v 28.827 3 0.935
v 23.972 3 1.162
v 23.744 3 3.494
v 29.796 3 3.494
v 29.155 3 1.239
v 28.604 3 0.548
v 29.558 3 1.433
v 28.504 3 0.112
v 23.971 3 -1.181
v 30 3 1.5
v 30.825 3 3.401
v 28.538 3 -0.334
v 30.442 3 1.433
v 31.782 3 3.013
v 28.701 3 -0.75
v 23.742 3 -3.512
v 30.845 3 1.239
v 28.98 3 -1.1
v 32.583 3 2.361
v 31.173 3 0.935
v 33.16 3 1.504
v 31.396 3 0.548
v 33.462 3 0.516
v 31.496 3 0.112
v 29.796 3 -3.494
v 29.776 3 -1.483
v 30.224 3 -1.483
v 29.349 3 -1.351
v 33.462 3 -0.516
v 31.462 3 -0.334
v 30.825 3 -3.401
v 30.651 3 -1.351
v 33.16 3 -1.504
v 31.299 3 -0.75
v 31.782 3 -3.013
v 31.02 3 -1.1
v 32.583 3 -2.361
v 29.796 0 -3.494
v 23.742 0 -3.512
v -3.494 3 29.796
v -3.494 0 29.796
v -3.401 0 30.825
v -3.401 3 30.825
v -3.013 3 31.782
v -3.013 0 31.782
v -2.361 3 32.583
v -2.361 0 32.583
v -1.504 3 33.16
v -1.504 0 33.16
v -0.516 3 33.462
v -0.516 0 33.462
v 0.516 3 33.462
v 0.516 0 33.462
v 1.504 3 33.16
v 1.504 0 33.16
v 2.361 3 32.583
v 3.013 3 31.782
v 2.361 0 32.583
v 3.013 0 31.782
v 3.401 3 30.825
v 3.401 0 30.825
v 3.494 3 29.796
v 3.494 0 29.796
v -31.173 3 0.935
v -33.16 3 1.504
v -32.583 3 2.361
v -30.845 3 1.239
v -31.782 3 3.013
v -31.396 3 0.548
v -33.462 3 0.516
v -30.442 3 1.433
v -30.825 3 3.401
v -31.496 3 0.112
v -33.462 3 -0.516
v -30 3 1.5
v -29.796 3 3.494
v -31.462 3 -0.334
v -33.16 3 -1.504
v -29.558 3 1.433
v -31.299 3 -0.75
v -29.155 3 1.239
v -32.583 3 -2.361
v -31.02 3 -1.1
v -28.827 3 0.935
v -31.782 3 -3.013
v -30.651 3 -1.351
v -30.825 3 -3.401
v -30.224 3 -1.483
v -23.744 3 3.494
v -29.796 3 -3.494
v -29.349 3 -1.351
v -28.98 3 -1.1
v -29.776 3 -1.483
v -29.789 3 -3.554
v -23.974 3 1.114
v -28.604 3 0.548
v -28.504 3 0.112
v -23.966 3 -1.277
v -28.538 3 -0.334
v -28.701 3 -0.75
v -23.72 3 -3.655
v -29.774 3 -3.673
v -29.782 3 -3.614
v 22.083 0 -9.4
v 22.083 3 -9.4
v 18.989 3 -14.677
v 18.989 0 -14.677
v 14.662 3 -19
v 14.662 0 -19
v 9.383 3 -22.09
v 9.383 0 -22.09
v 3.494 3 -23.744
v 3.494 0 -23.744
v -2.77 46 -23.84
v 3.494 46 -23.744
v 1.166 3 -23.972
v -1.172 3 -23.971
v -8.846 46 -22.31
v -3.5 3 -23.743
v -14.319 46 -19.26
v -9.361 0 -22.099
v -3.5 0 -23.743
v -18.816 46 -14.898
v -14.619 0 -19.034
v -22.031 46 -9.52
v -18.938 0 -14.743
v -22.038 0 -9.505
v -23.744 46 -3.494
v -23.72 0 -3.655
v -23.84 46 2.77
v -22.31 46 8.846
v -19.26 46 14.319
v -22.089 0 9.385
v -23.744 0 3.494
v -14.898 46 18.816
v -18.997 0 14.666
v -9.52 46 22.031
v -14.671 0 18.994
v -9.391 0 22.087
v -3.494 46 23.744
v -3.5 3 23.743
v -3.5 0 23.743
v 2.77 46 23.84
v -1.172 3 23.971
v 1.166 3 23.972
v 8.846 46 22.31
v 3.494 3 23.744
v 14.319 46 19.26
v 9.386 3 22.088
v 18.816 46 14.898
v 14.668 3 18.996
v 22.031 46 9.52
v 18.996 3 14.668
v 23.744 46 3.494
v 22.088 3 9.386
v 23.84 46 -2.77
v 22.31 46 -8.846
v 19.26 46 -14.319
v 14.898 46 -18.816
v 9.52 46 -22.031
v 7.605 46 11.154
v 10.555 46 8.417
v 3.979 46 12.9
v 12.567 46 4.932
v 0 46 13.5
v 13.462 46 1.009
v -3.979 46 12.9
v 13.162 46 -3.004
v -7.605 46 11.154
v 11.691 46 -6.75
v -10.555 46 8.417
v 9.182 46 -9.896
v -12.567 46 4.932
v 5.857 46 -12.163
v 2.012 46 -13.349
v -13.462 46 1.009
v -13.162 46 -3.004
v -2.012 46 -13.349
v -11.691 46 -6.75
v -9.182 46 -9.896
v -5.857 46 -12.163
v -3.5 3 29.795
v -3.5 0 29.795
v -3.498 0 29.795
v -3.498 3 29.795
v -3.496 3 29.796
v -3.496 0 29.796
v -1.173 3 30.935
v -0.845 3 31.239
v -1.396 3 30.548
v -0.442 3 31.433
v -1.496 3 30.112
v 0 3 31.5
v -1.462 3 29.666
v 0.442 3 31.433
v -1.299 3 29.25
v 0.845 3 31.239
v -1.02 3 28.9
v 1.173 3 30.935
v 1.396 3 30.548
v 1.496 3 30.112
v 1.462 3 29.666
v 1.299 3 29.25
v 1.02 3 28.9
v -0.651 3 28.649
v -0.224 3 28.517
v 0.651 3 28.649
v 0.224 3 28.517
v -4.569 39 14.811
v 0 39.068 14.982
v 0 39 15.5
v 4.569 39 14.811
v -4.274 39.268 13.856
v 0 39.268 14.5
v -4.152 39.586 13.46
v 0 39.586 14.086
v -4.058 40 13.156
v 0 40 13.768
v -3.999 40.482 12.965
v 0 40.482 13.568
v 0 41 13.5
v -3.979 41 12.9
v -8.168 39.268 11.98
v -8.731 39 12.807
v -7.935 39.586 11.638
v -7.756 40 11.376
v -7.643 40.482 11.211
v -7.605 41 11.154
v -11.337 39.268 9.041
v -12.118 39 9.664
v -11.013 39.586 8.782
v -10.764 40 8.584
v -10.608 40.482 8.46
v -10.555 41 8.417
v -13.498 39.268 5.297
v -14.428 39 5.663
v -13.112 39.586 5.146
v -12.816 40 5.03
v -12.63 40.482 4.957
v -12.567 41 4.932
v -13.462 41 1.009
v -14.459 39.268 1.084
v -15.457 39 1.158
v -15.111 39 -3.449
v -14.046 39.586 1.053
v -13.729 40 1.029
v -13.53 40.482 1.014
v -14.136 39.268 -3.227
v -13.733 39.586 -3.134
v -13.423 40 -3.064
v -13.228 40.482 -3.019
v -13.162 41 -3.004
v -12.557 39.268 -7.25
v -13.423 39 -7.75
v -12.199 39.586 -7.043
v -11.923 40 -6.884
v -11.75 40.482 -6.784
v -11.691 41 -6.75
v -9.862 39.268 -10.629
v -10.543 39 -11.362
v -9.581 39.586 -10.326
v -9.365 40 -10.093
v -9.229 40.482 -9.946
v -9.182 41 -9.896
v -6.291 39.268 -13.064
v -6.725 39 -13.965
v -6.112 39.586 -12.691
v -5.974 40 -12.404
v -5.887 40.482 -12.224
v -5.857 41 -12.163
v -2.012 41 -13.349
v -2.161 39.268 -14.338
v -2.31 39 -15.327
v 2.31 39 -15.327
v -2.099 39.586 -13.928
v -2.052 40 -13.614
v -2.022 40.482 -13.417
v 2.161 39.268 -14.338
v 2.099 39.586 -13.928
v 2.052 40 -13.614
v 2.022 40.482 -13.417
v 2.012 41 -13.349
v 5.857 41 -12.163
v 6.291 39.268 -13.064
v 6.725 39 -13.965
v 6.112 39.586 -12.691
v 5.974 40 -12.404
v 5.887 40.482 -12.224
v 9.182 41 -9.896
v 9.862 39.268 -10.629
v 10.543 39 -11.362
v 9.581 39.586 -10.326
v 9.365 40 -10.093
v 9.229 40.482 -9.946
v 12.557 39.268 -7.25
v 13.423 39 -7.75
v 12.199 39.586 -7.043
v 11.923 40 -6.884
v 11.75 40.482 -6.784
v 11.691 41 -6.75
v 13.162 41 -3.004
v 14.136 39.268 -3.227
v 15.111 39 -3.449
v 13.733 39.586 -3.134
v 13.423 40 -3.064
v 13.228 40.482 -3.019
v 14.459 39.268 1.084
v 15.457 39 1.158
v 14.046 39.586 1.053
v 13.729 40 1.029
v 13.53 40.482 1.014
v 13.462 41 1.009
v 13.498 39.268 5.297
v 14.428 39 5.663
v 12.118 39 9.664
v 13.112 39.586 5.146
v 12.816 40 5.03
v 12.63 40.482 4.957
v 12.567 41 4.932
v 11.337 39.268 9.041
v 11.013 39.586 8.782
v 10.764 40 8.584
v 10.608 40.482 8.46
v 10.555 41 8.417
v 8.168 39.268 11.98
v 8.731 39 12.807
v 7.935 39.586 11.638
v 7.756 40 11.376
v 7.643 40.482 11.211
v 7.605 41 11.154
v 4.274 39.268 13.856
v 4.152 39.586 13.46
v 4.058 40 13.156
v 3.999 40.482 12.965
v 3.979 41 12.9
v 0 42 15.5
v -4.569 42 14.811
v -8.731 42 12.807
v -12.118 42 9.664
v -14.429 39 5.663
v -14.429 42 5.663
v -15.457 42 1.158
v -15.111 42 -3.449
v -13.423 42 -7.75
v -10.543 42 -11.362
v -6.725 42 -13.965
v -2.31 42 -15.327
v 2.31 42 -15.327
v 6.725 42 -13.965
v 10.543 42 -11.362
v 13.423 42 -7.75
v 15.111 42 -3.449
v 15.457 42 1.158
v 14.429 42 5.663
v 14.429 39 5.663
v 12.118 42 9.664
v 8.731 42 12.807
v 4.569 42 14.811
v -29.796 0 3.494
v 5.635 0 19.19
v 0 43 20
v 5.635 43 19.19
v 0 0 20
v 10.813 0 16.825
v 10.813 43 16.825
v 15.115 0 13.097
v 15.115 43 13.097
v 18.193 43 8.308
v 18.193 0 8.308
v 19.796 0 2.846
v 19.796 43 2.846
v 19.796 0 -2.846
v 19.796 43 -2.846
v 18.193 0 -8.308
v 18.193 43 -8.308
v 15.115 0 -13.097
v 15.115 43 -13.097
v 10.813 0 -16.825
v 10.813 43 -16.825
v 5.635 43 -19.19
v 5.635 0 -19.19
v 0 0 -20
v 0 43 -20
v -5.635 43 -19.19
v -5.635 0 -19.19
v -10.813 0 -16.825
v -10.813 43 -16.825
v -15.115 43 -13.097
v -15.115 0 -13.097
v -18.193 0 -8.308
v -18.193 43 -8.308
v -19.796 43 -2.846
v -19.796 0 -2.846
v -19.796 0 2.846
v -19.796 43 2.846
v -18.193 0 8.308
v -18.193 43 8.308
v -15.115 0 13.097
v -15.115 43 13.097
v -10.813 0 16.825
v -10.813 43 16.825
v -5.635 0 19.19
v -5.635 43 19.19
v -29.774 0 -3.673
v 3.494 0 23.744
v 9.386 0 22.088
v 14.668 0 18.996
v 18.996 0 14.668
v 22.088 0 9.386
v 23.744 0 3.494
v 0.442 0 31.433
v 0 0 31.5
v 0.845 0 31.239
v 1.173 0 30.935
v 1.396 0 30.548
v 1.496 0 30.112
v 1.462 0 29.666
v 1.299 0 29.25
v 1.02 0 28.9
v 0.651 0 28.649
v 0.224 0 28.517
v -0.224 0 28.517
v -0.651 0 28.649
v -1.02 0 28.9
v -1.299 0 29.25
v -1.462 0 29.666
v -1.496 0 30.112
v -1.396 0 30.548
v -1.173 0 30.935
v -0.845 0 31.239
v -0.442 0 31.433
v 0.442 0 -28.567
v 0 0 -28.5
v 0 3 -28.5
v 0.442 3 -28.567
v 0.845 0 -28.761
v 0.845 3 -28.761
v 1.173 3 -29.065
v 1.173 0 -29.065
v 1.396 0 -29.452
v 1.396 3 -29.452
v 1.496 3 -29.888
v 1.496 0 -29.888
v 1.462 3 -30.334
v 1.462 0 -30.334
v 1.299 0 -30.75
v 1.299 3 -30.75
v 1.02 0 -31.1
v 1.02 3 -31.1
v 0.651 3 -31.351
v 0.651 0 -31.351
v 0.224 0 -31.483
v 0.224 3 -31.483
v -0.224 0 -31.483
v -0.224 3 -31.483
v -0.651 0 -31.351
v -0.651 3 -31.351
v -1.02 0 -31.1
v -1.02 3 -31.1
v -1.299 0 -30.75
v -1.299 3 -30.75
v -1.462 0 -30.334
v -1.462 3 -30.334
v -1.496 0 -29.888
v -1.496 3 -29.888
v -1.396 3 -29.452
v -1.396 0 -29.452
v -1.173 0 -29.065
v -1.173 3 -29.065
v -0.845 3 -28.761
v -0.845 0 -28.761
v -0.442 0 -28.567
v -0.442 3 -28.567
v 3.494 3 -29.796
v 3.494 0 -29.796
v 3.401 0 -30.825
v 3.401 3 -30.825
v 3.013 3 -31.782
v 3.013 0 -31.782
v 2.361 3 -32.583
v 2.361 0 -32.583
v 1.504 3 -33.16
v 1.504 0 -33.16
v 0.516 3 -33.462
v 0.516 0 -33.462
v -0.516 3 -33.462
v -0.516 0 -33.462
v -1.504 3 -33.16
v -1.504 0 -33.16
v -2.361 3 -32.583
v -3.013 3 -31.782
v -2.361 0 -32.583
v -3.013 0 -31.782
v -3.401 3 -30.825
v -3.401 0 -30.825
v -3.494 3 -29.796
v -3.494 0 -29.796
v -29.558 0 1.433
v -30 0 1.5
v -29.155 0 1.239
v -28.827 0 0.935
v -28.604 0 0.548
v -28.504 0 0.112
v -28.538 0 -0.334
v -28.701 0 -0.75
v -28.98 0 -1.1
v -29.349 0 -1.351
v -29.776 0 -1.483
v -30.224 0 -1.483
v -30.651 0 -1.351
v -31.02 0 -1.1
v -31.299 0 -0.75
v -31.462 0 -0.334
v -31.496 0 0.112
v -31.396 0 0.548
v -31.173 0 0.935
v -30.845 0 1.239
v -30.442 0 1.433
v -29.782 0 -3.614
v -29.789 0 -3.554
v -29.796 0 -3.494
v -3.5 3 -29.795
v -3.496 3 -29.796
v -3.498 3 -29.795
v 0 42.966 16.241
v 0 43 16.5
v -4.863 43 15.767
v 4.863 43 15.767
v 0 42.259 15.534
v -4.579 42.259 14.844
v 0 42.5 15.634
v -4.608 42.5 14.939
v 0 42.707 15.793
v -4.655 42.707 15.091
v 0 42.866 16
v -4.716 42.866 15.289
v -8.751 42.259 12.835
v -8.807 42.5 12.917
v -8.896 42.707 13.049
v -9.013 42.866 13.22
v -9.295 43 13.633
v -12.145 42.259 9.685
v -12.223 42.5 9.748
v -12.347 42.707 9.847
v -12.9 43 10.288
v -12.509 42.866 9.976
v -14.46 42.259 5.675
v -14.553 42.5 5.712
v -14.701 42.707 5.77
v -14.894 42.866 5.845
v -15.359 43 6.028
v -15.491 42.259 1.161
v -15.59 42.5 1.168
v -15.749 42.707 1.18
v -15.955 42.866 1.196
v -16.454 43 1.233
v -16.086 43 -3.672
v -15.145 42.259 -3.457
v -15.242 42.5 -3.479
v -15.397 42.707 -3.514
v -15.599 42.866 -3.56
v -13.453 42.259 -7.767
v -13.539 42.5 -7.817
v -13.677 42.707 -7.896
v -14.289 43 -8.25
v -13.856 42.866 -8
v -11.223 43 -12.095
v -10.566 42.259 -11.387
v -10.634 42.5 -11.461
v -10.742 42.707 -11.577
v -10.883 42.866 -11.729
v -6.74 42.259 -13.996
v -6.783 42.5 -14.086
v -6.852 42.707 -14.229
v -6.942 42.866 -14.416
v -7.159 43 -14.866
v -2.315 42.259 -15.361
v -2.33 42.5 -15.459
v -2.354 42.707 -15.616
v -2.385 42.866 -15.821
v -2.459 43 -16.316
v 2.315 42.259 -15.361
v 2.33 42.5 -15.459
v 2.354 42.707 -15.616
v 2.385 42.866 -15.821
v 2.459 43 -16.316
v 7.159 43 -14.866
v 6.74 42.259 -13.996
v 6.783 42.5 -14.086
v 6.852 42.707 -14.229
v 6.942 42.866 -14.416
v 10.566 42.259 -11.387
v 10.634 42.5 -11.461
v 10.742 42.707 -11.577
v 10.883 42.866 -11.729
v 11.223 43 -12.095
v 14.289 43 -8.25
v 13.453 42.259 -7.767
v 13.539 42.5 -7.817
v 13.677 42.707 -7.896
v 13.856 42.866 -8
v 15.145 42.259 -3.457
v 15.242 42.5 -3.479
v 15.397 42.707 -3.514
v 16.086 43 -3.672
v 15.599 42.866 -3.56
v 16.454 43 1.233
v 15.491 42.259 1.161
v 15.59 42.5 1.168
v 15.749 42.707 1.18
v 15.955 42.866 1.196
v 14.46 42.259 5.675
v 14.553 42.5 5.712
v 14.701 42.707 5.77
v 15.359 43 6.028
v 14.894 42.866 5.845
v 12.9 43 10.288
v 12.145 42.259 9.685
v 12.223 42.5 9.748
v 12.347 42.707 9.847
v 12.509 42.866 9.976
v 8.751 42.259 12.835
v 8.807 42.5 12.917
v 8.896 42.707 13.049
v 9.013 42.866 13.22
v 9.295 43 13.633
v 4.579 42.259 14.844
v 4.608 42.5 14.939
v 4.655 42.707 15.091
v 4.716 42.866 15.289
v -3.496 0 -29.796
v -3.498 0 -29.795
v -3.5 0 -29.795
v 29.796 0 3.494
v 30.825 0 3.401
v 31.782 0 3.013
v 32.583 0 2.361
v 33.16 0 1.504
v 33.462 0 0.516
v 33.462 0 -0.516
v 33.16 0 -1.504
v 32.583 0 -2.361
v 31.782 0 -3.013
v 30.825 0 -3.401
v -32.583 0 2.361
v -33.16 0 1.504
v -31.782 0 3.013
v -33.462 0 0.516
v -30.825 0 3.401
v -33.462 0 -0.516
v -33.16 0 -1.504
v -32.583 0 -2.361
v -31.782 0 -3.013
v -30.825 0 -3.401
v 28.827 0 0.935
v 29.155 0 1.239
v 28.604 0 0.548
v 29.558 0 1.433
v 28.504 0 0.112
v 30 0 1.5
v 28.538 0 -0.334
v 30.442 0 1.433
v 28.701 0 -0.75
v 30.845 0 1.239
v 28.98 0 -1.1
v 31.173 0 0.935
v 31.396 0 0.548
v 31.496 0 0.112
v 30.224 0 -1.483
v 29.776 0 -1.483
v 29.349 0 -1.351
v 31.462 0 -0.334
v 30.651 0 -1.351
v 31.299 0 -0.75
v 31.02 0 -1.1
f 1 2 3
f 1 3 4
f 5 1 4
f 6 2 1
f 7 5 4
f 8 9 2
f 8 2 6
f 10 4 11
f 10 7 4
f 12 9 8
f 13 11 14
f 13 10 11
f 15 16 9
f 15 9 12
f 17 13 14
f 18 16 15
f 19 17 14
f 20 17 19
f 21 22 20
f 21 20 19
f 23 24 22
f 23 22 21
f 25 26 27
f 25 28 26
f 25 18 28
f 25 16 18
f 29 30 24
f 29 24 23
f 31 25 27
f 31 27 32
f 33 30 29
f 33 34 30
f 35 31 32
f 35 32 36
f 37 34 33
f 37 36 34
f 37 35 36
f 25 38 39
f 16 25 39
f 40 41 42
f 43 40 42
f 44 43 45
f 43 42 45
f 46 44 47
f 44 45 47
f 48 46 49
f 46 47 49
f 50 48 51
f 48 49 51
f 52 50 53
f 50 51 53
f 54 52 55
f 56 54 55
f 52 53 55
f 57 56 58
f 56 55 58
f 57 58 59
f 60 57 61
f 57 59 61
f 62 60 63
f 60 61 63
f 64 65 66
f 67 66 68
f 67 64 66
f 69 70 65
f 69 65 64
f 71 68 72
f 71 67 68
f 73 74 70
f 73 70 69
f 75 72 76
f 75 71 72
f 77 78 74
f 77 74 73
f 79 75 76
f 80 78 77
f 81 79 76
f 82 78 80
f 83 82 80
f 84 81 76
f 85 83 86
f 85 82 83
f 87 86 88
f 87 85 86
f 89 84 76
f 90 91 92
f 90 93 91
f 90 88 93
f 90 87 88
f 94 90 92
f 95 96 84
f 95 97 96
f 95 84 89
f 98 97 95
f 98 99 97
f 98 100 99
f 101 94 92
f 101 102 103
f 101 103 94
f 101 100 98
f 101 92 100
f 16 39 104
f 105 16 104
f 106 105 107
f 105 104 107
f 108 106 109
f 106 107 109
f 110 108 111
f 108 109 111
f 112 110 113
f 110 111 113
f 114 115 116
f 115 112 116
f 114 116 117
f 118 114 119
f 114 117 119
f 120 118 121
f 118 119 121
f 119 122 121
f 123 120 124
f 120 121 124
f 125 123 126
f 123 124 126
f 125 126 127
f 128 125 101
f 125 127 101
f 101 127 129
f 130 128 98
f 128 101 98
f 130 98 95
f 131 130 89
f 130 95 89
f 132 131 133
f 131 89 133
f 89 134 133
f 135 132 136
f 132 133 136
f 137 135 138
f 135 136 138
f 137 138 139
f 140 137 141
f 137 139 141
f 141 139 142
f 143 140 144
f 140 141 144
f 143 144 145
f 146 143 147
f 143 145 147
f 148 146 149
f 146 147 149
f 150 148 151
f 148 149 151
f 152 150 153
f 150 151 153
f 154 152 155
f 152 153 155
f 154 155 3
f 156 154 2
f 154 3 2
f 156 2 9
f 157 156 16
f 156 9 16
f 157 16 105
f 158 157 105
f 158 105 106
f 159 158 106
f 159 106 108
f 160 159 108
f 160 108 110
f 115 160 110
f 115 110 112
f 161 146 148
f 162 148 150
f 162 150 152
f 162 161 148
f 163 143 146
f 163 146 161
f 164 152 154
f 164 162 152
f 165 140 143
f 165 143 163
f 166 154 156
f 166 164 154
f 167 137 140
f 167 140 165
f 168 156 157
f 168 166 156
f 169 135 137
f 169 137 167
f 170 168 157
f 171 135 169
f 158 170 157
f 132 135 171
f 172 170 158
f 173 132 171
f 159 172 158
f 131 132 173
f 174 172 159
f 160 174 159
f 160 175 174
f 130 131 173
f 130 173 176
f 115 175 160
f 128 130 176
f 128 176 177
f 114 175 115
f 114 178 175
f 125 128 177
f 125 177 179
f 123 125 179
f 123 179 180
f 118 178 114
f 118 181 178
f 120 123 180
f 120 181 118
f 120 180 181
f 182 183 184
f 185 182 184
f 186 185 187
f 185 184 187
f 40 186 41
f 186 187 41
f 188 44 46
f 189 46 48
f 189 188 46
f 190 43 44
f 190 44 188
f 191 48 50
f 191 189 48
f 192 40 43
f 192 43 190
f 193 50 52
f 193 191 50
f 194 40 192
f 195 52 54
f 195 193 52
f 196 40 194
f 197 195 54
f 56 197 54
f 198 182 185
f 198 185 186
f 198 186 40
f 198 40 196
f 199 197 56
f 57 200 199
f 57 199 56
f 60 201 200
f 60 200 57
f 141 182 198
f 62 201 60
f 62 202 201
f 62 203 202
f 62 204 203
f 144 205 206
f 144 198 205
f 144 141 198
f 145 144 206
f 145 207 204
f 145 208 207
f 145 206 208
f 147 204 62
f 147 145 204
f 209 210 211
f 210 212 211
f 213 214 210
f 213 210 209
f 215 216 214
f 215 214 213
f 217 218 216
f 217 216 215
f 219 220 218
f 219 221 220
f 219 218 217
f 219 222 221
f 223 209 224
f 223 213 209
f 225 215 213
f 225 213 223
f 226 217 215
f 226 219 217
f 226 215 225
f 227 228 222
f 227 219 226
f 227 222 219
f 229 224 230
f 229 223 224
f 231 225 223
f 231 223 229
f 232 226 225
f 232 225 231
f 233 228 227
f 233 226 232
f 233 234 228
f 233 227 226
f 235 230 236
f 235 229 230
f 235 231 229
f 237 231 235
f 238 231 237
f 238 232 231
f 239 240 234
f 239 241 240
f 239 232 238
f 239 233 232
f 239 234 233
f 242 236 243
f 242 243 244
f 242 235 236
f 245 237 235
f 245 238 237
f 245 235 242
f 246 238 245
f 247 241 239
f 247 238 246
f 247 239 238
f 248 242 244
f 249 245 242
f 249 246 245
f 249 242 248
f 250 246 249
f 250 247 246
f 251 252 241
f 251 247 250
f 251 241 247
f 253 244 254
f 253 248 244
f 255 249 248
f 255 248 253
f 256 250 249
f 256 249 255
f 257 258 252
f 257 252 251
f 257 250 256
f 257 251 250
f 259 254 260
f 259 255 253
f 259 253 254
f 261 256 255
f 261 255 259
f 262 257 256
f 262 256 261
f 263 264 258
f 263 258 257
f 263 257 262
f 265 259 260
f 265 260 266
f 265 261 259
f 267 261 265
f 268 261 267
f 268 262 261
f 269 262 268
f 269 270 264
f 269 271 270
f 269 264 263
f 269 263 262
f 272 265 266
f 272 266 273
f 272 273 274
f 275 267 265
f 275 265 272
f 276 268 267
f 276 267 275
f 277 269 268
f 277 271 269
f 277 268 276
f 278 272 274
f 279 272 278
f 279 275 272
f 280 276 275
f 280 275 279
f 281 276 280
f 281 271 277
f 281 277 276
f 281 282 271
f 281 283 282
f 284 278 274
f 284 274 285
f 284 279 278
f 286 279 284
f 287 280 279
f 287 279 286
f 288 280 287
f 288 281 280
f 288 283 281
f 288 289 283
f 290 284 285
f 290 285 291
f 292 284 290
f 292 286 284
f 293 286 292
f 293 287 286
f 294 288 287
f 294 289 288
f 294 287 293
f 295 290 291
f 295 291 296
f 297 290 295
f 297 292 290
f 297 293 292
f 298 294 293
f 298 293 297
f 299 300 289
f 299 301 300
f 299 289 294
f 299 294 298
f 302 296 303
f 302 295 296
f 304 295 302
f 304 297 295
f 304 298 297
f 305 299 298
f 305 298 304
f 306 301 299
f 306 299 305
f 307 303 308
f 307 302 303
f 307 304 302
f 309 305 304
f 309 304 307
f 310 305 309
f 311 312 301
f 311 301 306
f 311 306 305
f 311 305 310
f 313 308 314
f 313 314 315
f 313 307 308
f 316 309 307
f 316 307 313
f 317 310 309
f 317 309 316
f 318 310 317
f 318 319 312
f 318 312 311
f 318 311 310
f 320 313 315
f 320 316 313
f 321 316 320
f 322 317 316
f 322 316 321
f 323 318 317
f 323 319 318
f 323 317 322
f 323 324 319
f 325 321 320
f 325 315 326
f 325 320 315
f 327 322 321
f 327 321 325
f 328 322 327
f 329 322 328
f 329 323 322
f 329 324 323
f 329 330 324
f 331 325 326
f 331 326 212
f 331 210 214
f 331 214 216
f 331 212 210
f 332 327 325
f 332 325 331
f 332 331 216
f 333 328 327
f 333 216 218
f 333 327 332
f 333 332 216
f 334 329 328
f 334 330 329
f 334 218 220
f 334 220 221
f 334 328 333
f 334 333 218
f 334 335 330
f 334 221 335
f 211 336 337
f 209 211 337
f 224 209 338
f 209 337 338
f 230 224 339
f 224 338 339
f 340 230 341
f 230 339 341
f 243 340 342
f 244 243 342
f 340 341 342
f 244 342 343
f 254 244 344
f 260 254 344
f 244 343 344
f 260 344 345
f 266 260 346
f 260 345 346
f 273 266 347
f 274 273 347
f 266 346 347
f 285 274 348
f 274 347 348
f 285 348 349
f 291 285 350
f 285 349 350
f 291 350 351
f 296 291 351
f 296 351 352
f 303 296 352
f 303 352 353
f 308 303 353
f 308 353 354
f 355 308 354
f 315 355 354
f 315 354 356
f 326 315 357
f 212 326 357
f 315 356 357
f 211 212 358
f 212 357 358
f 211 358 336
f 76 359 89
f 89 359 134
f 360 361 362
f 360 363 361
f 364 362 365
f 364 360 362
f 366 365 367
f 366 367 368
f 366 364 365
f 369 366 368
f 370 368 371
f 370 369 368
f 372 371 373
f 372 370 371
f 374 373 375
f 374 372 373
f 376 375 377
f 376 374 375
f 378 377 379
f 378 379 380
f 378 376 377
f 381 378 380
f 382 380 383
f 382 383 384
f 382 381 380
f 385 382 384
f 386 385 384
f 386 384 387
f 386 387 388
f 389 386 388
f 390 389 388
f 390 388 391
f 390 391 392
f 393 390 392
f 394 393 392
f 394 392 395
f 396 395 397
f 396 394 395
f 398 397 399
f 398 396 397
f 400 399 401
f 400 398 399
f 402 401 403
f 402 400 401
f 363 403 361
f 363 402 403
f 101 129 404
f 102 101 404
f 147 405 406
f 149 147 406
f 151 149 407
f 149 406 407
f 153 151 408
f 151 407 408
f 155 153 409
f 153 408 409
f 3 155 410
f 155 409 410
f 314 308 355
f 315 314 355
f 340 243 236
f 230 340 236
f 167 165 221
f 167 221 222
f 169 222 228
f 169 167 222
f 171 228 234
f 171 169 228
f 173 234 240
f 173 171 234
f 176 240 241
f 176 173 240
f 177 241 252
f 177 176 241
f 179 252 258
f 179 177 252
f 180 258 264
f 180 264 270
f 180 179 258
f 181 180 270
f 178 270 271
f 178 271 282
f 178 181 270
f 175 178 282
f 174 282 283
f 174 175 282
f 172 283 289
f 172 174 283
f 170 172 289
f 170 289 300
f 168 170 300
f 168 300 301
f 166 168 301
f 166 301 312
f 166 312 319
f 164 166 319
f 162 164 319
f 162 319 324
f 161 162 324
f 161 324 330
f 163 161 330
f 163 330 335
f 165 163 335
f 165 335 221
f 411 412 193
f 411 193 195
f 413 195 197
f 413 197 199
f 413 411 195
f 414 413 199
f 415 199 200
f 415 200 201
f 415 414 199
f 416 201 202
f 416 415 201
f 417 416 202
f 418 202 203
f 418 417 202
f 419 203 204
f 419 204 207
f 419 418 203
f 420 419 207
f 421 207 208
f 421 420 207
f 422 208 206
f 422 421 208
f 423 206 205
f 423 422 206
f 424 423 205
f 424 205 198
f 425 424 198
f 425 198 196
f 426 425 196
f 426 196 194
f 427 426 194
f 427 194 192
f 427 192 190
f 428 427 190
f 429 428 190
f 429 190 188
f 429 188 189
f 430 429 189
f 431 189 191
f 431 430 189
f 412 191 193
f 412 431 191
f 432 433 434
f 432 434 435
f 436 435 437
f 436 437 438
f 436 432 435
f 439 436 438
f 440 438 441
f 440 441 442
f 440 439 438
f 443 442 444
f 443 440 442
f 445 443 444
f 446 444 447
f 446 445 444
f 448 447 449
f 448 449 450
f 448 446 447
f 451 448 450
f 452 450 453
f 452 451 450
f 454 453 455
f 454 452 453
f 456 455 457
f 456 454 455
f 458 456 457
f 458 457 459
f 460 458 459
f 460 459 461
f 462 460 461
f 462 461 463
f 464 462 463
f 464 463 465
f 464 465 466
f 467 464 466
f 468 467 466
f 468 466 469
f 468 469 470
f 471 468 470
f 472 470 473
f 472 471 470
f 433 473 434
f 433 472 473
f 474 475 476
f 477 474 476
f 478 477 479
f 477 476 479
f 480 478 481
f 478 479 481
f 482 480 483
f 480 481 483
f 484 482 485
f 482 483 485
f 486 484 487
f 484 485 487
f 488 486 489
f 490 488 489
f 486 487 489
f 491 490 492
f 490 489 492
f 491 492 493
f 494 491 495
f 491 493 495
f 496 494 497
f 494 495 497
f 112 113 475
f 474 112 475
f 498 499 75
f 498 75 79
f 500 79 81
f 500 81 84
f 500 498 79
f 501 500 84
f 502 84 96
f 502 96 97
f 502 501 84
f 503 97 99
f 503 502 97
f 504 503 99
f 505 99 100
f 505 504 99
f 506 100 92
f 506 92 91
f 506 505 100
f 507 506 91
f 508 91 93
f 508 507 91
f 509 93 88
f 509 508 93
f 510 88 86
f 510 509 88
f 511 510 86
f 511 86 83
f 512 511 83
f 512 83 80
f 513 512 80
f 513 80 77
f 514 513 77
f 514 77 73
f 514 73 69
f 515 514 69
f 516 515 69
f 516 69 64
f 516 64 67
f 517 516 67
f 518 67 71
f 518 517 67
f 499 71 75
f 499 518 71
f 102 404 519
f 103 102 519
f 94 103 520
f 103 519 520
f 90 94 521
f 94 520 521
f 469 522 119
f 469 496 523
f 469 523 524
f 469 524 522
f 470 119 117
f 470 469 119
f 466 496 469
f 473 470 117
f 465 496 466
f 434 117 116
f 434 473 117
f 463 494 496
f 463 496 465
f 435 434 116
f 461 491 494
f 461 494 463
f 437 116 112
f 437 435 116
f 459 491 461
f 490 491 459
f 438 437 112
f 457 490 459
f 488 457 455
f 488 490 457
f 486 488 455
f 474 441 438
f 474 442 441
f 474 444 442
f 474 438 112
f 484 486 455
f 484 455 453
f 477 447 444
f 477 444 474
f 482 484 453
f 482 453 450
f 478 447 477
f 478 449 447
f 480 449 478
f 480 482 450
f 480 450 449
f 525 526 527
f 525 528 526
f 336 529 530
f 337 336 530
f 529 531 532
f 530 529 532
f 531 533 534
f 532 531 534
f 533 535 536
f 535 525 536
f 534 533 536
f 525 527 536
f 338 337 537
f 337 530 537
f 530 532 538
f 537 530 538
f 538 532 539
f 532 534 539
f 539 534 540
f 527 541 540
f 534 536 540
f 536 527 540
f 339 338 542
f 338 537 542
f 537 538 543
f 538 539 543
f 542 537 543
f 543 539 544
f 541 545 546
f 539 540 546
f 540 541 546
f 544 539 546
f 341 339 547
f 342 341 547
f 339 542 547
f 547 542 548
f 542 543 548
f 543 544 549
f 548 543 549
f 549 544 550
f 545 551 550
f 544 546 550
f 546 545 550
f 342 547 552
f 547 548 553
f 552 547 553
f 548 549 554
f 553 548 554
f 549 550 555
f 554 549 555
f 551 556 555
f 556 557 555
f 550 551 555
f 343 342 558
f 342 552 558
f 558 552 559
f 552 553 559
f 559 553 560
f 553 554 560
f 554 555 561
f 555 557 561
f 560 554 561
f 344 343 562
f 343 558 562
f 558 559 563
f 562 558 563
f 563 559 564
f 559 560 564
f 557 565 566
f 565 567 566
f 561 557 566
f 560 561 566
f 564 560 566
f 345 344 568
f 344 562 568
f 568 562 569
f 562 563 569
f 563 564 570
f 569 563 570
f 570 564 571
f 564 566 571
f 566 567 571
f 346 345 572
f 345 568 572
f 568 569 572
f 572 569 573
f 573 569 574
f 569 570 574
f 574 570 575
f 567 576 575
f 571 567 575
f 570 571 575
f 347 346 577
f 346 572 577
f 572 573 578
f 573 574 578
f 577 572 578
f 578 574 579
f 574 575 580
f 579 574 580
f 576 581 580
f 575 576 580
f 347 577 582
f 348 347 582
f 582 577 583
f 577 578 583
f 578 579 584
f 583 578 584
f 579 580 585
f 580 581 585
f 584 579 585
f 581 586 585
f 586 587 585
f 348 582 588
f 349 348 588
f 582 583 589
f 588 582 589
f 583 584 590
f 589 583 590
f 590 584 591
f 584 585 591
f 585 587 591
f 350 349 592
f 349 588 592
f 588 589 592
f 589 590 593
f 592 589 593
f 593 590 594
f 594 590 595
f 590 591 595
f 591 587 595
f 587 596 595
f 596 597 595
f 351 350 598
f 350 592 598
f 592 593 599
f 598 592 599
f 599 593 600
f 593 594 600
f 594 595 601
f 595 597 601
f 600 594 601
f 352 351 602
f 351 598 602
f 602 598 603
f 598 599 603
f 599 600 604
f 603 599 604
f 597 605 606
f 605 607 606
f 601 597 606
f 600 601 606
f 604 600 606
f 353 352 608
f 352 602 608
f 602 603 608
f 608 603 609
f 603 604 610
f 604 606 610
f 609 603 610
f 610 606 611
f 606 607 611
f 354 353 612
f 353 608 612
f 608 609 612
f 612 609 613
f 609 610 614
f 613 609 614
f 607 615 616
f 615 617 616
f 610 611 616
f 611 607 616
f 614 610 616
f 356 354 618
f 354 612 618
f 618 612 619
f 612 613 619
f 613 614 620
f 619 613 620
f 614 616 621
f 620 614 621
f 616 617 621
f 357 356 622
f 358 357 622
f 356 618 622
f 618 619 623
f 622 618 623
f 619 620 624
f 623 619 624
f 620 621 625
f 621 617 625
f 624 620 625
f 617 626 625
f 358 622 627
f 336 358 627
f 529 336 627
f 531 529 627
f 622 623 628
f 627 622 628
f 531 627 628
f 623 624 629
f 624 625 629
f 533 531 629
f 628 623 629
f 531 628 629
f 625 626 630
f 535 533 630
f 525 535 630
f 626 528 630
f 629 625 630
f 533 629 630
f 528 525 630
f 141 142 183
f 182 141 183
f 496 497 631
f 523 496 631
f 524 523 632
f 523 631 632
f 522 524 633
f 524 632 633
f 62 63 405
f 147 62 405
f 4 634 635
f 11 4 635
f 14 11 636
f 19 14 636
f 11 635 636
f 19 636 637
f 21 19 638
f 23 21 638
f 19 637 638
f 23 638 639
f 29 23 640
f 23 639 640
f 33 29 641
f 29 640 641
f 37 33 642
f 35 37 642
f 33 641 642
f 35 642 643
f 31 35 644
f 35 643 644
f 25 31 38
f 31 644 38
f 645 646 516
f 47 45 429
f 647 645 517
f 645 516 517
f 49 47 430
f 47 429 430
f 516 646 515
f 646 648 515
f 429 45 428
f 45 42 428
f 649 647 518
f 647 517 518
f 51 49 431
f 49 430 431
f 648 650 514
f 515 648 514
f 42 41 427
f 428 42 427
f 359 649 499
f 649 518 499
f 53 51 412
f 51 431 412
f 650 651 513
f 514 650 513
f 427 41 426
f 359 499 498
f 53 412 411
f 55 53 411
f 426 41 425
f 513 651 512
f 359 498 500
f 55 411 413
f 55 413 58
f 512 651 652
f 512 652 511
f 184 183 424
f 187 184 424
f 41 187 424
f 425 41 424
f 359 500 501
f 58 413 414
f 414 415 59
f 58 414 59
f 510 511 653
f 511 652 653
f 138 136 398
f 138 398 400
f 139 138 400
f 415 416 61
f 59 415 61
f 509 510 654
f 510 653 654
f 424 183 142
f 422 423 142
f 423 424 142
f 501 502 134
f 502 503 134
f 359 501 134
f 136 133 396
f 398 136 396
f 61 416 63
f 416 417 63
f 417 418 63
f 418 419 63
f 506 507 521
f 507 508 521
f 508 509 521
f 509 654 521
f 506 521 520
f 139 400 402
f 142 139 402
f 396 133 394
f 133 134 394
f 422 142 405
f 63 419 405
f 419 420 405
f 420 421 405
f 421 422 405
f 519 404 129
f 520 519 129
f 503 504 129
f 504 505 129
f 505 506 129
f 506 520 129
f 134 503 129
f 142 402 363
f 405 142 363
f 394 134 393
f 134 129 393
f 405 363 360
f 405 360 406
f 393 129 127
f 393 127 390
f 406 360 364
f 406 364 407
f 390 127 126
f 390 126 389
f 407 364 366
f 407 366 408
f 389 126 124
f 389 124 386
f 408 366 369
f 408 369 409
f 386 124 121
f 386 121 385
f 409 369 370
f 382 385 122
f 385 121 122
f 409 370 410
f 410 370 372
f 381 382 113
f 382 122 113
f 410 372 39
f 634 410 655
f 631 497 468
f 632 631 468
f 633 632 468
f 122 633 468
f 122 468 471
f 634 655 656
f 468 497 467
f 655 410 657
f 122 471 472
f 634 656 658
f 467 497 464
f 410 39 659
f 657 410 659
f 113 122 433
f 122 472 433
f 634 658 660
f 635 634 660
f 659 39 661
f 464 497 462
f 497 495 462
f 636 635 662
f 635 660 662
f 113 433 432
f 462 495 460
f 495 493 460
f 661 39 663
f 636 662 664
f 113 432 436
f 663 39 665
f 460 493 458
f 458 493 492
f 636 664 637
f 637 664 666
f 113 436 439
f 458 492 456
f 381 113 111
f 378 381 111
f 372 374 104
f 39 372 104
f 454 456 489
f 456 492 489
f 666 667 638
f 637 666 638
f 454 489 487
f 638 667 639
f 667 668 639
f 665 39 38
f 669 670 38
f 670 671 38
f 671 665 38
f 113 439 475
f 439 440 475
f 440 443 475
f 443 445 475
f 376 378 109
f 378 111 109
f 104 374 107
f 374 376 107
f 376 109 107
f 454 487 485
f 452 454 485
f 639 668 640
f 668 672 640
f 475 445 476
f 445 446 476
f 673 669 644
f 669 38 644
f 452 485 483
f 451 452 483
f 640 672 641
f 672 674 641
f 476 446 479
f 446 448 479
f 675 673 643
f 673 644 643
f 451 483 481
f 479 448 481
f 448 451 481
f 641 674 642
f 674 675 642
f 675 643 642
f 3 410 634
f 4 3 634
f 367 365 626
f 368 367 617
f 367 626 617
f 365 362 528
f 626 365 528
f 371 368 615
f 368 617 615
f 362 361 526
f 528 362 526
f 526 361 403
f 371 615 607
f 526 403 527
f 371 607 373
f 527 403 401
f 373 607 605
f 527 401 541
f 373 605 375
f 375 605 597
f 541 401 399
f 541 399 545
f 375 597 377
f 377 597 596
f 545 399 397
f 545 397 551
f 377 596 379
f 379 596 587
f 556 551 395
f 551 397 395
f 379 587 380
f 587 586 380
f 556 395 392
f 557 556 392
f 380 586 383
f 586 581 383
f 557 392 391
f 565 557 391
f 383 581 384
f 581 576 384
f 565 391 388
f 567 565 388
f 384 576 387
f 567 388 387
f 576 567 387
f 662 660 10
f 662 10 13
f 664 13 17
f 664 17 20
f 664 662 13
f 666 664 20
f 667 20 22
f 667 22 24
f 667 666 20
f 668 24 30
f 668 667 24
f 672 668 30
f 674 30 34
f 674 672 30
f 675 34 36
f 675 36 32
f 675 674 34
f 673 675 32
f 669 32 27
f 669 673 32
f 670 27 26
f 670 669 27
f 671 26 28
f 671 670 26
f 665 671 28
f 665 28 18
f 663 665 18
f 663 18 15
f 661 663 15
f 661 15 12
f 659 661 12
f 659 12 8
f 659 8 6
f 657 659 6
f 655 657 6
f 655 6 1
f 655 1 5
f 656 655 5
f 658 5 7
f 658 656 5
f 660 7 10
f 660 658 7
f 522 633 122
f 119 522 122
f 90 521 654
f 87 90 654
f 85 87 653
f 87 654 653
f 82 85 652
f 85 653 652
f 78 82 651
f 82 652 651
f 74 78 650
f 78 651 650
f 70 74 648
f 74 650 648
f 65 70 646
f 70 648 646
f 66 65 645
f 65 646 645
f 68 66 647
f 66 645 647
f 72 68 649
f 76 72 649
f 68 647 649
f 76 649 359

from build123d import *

# Parameters (mm, degrees)
SKETCH1_R           = 1.5
SKETCH1_R_2         = 20
BOSS_EXTRUDE1_DEPTH = 3
SKETCH2_R           = 24
SKETCH2_R_2         = 20
BOSS_EXTRUDE2_DEPTH = 40
SKETCH3_R           = 24
BOSS_EXTRUDE3_DEPTH = 3
SKETCH4_R           = 13.5
CUT_EXTRUDE1_DEPTH  = 67.034082109
SKETCH5_R           = 15.5
SKETCH5_R_2         = 13.5
BOSS_EXTRUDE4_DEPTH = 4
FILLET1_R           = 1
FILLET2_R           = 2


with BuildPart() as part:
    # Sketch1 → Boss-Extrude1 (new body)
    with BuildSketch(Plane(origin=(0, 0, 0), x_dir=(1, 0, 0), z_dir=(0, 1, 0))):
        with BuildLine():
            ThreePointArc((-29.774250944, 3.673415402), (-29.785177171, 3.58374398), (-29.795833333, 3.494040065))
            ThreePointArc((-29.795833333, 3.494040065), (-33.5, 0), (-29.795833333, -3.494040065))
            Line((-29.795833333, -3.494040065), (-23.744297927, -3.494040065))
            ThreePointArc((-23.744297927, -3.494040065), (-16.972692501, -16.968432728), (-3.5, -23.743420141))
            Line((-3.5, -23.743420141), (-3.5, -29.795133831))
            ThreePointArc((-3.5, -29.795133831), (-3.49702005, -29.795483731), (-3.494040065, -29.795833333))
            ThreePointArc((-3.494040065, -29.795833333), (0, -33.5), (3.494040064, -29.795833333))
            Line((3.494040064, -29.795833333), (3.494040064, -23.744297927))
            ThreePointArc((3.494040064, -23.744297927), (16.970562748, -16.970562749), (23.744297927, -3.494040065))
            Line((23.744297927, -3.494040065), (29.795833333, -3.494040065))
            ThreePointArc((29.795833333, -3.494040064), (33.5, 0), (29.795833333, 3.494040064))
            Line((29.795833333, 3.494040064), (23.741608141, 3.512270334))
            ThreePointArc((23.741608141, 3.512270334), (16.964046346, 16.97707665), (3.494040064, 23.744297927))
            Line((3.494040064, 23.744297927), (3.494040064, 29.795833333))
            ThreePointArc((3.494040064, 29.795833333), (0, 33.5), (-3.494040065, 29.795833333))
            ThreePointArc((-3.494040064, 29.795833333), (-3.49702005, 29.795483731), (-3.5, 29.795133831))
            Line((-3.5, 29.795133831), (-3.5, 23.743420141))
            ThreePointArc((-3.5, 23.743420141), (-16.914985868, 17.025958213), (-23.720025751, 3.655185133))
            Line((-23.720025751, 3.655185133), (-29.774250944, 3.673415402))
        make_face()
        with Locations(Location((0, -30, 0), (0, 0, 270))):
            Circle(SKETCH1_R, mode=Mode.SUBTRACT)
        with Locations(Location((-30, 0, 0), (0, 0, 270))):
            Circle(SKETCH1_R, mode=Mode.SUBTRACT)
        with Locations(Location((0, 0, 0), (0, 0, 270))):
            Circle(SKETCH1_R_2, mode=Mode.SUBTRACT)
        with Locations(Location((0, 30, 0), (0, 0, 270))):
            Circle(SKETCH1_R, mode=Mode.SUBTRACT)
        with Locations(Location((30, 0, 0), (0, 0, 270))):
            Circle(SKETCH1_R, mode=Mode.SUBTRACT)
    extrude(amount=BOSS_EXTRUDE1_DEPTH)

    # Sketch2 → Boss-Extrude2 (add)
    with BuildSketch(Plane(origin=(0, 3, 0), x_dir=(1, 0, 0), z_dir=(0, 1, 0))):
        with Locations(Location((0, 0, 0), (0, 0, 81.628843141))):
            Circle(SKETCH2_R)
        with Locations(Location((0, 0, 0), (0, 0, 270))):
            Circle(SKETCH2_R_2, mode=Mode.SUBTRACT)
    extrude(amount=BOSS_EXTRUDE2_DEPTH)

    # Sketch3 → Boss-Extrude3 (add)
    with BuildSketch(Plane(origin=(0, 43, 0), x_dir=(1, 0, 0), z_dir=(0, 1, 0))):
        with Locations(Location((0, 0, 0), (0, 0, 81.628843141))):
            Circle(SKETCH3_R)
    extrude(amount=BOSS_EXTRUDE3_DEPTH)

    # Sketch4 → Cut-Extrude1 (cut, through all)
    with BuildSketch(Plane(origin=(0, 46, 0), x_dir=(1, 0, 0), z_dir=(0, 1, 0))):
        with Locations(Location((0, 0, 0), (0, 0, 270))):
            Circle(SKETCH4_R)
    extrude(amount=-CUT_EXTRUDE1_DEPTH, mode=Mode.SUBTRACT)

    # Sketch5 → Boss-Extrude4 (add)
    with BuildSketch(Plane.XZ.offset(-43)):
        with Locations(Location((0, 0, 0), (0, 0, 90))):
            Circle(SKETCH5_R)
        with Locations(Location((0, 0, 0), (0, 0, 90))):
            Circle(SKETCH5_R_2, mode=Mode.SUBTRACT)
    extrude(amount=BOSS_EXTRUDE4_DEPTH)

    # Fillet1
    fillet1_edges = [part.edges().sort_by_distance(p)[0] for p in [
        (0, 43, -15.5),
    ]]
    fillet(fillet1_edges, radius=FILLET1_R)

    # Fillet2
    fillet2_edges = [part.edges().sort_by_distance(p)[0] for p in [
        (0, 39, -13.5),
    ]]
    fillet(fillet2_edges, radius=FILLET2_R - 0.0001)  # a hair under: the kernel refuses the full size


solid = part.part
